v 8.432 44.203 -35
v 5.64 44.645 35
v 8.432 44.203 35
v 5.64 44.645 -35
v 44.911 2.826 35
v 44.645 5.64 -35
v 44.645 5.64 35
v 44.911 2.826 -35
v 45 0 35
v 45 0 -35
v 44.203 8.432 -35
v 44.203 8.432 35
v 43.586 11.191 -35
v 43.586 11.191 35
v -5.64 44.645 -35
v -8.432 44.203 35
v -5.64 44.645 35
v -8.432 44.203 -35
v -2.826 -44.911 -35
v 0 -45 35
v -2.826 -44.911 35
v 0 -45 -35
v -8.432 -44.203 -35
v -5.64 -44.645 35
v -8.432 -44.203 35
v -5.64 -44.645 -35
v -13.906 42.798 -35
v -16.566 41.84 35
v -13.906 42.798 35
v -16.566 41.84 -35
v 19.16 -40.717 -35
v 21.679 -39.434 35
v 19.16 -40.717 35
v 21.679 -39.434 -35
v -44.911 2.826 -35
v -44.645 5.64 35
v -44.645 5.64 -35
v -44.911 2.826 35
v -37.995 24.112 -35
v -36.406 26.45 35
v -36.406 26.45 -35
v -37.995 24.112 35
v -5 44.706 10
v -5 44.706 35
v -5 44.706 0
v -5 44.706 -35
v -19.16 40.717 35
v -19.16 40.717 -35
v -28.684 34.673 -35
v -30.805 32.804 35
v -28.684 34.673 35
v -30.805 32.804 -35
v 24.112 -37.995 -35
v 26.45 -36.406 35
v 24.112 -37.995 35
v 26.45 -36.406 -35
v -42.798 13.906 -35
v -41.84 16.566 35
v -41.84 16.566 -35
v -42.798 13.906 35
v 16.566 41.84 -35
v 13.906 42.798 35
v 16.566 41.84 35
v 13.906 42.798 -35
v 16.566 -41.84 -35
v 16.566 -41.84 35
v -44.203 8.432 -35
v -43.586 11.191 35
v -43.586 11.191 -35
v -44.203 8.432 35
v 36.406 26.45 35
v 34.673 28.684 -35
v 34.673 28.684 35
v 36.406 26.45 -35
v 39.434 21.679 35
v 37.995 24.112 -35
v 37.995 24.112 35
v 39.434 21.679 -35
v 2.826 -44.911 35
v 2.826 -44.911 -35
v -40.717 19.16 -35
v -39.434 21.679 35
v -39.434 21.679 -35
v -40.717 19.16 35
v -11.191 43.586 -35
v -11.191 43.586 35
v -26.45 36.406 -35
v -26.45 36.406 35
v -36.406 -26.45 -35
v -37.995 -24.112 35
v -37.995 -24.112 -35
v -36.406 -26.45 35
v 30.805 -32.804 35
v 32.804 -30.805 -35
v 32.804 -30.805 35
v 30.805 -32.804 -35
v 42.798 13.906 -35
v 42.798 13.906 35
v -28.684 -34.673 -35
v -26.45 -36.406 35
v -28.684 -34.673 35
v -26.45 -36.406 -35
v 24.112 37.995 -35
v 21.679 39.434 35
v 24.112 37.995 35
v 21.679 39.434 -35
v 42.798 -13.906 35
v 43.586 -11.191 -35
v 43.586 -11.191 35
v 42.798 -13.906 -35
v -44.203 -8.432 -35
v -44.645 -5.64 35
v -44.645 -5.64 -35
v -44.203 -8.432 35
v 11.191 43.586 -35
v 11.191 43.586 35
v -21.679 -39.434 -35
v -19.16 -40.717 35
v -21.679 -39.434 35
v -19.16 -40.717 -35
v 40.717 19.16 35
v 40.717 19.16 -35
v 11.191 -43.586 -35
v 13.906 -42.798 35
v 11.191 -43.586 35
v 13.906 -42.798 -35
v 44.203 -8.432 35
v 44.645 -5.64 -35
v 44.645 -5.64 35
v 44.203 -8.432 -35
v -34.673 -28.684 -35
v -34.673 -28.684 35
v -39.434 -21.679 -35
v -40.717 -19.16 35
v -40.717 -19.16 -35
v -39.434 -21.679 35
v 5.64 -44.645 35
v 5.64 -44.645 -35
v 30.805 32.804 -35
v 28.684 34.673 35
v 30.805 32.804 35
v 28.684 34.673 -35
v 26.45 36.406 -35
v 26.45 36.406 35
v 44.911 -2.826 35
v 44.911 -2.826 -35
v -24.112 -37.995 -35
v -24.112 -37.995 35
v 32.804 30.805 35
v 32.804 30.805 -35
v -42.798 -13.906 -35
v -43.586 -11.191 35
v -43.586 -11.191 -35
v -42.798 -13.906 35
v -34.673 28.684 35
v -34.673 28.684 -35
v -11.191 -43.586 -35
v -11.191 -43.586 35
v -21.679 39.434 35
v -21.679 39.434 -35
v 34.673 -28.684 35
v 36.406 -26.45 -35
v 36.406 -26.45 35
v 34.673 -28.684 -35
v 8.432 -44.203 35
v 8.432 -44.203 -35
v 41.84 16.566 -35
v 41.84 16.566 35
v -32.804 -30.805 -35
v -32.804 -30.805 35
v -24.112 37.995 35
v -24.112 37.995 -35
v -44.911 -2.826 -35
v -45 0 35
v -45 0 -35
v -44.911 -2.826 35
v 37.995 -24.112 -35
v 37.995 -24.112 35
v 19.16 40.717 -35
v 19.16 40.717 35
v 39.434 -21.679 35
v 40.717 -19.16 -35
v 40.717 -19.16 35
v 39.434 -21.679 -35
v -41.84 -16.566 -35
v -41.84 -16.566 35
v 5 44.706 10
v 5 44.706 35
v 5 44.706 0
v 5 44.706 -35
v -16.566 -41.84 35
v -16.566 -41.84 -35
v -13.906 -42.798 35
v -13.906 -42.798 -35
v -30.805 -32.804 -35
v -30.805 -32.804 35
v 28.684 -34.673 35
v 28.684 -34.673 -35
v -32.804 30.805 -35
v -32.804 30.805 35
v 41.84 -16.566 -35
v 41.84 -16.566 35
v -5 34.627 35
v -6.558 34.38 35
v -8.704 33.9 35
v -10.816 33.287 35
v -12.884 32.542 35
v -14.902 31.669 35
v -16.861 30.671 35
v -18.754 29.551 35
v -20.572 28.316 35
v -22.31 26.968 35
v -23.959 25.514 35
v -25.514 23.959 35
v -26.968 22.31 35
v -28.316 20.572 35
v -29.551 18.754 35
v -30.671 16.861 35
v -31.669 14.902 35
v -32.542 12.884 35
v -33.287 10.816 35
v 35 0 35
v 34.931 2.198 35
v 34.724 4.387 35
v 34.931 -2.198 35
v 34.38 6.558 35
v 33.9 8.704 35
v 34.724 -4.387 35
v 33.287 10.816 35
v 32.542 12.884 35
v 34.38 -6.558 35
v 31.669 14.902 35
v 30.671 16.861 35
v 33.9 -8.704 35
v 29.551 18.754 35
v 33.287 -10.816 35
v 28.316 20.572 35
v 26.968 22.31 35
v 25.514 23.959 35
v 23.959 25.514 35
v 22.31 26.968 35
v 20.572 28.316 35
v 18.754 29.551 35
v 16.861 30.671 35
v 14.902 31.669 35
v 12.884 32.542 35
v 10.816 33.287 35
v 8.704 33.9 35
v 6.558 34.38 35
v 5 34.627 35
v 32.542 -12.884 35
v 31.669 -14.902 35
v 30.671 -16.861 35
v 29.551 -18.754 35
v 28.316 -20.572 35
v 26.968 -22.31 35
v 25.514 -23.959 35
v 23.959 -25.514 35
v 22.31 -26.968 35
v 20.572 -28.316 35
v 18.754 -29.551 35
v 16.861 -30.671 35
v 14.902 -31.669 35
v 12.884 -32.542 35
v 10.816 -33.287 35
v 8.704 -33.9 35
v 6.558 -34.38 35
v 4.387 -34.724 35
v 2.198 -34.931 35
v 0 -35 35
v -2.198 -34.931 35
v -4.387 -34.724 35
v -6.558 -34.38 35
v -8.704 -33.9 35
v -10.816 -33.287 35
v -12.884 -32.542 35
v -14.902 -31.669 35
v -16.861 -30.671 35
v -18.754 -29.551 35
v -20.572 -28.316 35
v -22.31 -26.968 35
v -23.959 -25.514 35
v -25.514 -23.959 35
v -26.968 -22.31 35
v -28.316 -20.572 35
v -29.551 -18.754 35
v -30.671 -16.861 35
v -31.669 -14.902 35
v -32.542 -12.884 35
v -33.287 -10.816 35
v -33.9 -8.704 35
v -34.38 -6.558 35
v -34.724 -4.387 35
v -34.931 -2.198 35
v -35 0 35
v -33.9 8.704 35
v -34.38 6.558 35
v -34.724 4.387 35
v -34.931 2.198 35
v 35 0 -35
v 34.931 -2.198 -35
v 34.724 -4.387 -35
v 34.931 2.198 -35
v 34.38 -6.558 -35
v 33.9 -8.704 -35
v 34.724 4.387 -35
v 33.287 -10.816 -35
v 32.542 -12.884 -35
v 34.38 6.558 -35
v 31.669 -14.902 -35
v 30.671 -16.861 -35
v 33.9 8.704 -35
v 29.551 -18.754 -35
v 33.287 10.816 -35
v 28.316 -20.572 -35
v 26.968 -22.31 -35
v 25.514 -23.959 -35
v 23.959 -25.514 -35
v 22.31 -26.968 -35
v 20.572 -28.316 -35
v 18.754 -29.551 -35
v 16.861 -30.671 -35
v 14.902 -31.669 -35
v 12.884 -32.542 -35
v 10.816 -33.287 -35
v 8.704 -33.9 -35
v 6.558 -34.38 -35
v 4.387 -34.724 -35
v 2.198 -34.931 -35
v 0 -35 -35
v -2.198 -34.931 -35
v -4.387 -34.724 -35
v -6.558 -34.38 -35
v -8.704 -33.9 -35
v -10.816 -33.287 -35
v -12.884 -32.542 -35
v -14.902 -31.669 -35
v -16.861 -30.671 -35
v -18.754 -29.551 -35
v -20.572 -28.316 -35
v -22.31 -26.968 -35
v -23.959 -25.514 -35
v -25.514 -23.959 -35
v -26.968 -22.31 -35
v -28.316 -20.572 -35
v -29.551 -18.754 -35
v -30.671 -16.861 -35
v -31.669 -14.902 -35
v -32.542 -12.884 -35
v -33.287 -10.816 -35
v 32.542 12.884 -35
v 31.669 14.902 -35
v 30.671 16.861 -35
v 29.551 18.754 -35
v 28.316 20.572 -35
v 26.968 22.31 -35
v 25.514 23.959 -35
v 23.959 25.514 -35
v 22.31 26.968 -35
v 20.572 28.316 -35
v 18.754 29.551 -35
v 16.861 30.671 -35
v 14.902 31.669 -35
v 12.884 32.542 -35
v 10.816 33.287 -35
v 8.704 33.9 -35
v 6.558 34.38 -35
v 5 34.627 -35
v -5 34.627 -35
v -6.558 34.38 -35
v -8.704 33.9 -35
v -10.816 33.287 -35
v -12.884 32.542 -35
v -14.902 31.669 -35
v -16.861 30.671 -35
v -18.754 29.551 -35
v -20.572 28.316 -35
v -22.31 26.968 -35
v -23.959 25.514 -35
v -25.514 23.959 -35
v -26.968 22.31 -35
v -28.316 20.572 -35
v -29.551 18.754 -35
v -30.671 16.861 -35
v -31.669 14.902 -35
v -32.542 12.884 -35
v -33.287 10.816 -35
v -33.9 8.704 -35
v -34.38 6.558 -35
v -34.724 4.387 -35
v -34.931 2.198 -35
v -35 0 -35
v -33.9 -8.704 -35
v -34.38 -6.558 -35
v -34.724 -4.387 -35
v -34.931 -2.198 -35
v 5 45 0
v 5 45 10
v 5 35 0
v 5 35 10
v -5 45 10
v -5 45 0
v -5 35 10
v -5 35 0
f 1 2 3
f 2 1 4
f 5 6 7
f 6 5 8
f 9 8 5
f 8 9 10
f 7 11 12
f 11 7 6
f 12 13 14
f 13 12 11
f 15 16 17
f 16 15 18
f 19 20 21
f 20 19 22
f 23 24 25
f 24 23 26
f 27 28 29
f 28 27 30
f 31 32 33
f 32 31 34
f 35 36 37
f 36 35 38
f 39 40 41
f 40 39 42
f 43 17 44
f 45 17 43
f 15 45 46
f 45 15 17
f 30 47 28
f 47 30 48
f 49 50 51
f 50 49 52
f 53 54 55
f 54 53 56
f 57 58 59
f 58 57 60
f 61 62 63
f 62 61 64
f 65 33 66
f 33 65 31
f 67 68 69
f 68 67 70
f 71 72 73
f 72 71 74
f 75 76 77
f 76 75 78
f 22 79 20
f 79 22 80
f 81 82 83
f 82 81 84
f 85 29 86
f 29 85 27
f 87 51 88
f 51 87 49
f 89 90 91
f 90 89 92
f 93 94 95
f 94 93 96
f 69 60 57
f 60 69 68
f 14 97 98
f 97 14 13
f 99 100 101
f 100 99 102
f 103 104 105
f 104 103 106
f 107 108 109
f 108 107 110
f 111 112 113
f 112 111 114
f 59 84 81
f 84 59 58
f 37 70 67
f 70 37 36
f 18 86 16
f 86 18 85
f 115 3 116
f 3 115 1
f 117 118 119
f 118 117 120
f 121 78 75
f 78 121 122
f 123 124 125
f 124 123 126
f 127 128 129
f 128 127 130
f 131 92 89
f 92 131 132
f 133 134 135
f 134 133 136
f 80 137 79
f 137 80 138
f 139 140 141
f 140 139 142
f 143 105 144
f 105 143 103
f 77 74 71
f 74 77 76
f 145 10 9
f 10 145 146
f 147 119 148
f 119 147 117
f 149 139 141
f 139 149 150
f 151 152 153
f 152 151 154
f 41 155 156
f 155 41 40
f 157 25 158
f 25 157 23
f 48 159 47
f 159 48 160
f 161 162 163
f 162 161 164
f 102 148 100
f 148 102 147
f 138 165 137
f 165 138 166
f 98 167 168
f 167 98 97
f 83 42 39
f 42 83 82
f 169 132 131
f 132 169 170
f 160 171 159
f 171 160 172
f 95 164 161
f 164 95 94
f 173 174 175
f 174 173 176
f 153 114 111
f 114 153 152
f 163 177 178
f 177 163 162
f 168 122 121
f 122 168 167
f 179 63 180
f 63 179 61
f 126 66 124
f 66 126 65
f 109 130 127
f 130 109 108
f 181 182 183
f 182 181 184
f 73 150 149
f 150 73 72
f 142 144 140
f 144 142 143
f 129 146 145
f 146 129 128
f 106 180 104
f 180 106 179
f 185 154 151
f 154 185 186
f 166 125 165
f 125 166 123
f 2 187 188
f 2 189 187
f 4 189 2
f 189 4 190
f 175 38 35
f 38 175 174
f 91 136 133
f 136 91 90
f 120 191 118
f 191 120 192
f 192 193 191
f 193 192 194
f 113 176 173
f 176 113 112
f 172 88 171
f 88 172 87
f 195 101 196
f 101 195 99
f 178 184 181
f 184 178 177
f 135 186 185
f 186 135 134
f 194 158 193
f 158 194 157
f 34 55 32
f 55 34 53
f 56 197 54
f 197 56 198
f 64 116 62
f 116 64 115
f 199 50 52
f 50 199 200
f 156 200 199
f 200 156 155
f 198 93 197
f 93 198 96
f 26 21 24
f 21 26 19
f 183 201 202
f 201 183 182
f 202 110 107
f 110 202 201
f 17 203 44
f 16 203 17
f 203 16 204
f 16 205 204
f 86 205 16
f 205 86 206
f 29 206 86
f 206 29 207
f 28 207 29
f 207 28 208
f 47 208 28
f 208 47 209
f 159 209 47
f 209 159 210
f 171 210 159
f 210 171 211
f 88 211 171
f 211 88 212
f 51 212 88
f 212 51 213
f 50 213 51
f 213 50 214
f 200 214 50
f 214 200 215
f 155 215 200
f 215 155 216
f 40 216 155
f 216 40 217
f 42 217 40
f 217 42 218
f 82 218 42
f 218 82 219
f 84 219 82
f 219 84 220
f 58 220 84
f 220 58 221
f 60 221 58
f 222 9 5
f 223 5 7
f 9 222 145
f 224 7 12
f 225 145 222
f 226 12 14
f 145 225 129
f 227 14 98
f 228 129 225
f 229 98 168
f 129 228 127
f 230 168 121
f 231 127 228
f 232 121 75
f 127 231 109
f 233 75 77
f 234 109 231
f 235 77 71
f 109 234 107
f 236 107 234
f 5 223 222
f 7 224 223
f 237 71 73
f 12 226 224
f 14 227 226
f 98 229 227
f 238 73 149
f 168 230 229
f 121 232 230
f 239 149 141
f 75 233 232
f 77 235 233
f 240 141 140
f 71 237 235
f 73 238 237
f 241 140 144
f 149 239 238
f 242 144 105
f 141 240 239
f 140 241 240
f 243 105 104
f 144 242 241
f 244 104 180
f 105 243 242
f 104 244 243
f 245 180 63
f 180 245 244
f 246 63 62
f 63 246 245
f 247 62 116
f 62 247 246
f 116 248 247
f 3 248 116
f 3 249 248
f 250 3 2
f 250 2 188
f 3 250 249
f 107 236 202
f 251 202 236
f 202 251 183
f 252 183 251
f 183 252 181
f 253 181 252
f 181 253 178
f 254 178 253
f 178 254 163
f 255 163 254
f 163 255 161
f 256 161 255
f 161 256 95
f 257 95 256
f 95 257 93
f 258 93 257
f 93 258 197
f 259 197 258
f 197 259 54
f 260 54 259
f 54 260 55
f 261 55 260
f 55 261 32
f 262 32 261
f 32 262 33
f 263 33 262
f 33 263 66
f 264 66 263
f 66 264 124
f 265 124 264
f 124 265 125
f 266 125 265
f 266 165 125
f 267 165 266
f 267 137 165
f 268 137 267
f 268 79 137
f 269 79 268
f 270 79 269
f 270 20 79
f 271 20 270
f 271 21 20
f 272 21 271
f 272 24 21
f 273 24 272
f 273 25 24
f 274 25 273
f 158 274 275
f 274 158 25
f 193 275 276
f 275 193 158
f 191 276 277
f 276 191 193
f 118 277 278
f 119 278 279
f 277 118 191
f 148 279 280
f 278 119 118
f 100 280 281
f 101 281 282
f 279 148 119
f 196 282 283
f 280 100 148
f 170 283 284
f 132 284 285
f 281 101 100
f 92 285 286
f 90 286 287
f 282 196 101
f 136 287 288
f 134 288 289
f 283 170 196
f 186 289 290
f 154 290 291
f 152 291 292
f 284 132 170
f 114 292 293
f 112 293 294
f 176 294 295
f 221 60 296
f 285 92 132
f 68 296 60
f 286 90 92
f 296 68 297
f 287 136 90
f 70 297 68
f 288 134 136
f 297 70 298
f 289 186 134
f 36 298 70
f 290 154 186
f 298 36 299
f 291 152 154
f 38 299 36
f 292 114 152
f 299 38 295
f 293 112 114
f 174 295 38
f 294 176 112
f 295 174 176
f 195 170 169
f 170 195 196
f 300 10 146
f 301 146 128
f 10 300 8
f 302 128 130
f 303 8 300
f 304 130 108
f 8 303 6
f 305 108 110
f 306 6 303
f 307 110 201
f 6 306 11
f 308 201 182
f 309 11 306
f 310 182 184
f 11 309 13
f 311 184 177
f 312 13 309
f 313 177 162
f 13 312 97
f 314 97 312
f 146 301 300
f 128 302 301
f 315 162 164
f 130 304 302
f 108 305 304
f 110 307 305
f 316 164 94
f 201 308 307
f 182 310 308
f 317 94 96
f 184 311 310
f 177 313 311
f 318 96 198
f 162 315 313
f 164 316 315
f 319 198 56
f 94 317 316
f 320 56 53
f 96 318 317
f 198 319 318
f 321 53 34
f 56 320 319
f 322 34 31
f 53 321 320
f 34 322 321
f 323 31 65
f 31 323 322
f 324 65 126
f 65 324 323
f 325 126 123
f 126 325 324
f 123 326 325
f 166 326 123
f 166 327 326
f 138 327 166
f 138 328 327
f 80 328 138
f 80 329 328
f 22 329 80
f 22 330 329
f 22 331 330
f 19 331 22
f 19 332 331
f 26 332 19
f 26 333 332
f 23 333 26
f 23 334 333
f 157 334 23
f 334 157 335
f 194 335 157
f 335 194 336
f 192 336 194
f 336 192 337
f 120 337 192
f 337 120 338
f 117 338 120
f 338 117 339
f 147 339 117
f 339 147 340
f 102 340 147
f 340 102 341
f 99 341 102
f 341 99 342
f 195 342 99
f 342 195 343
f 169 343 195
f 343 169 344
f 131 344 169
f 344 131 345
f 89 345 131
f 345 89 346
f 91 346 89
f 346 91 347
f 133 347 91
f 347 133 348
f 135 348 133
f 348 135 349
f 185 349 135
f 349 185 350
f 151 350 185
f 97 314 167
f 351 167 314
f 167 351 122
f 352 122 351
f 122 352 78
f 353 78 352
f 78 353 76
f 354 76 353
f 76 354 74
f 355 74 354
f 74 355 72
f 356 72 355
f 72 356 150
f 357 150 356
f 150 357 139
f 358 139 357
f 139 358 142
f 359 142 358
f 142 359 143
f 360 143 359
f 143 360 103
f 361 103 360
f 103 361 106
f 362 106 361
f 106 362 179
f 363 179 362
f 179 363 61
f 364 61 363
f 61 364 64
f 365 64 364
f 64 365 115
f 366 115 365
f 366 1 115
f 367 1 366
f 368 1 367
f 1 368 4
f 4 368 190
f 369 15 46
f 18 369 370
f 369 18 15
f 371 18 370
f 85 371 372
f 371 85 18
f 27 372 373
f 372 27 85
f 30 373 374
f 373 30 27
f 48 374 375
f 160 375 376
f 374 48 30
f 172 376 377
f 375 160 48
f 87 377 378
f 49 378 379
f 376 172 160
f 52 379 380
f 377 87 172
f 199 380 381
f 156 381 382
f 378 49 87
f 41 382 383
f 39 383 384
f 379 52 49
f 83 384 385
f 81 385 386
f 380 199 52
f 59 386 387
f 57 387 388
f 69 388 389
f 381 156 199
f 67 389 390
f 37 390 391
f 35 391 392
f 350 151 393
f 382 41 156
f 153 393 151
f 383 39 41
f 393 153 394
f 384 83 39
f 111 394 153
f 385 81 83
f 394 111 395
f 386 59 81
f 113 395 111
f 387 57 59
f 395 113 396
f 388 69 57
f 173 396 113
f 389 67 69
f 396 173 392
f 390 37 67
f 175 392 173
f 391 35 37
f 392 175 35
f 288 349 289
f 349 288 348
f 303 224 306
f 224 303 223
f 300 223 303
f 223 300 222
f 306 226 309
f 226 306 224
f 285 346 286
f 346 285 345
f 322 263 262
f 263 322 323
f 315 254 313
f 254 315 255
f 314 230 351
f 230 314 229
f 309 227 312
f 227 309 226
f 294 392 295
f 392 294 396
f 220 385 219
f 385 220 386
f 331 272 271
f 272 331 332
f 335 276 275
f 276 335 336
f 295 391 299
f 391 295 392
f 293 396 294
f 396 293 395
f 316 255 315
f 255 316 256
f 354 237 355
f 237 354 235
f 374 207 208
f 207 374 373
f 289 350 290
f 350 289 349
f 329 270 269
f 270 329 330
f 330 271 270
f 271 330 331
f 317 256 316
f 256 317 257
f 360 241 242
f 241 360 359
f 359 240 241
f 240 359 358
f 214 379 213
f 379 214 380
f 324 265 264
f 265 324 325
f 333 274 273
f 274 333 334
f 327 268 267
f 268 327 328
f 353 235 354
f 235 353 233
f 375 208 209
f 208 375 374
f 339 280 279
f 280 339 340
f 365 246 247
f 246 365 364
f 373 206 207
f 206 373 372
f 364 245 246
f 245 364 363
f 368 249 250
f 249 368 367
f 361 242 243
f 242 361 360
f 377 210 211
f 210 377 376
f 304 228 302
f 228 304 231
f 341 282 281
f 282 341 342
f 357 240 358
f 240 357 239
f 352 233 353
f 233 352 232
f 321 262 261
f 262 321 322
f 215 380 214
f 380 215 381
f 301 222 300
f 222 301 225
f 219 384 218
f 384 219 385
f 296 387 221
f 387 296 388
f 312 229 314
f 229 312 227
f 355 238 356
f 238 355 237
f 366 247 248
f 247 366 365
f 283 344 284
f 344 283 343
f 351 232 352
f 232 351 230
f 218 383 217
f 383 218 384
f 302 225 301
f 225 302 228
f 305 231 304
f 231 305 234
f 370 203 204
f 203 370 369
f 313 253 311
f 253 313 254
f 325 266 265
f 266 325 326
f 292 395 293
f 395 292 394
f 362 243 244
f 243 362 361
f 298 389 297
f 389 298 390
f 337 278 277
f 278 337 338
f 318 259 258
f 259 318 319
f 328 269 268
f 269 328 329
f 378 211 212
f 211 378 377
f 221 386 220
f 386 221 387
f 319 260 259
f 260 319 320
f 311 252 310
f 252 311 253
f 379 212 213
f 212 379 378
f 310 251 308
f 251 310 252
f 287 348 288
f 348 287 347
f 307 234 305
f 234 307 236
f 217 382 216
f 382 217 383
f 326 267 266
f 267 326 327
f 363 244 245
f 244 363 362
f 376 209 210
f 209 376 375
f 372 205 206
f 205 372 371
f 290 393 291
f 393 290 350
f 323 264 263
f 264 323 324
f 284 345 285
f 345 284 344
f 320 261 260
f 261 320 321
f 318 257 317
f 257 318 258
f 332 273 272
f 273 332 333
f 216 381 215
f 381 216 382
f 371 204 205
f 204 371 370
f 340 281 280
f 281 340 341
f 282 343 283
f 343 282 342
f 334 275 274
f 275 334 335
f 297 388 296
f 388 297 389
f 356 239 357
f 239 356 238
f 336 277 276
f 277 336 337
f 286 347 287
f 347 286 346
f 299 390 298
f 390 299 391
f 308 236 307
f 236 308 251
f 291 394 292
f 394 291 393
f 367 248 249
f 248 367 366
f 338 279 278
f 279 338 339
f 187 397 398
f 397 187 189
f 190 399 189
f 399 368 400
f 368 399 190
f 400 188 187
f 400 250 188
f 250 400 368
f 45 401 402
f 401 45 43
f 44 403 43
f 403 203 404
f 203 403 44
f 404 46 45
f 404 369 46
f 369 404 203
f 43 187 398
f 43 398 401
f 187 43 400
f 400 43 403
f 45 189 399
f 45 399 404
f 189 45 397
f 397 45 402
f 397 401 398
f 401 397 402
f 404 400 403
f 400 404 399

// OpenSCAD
$fn = 100;

h = 70;
1k_stand_r = 35;


difference() {
    cylinder(r=1k_stand_r + 10, h=h, center=true);
    cylinder(r=1k_stand_r, h=h, center=true);
    translate([-5, 0, -h/2]) {
        cube([10, 1k_stand_r * 2, h]);
    }
}

translate([-5, 1k_stand_r, 0]) {
    cube([10, 10, 10]);
}
